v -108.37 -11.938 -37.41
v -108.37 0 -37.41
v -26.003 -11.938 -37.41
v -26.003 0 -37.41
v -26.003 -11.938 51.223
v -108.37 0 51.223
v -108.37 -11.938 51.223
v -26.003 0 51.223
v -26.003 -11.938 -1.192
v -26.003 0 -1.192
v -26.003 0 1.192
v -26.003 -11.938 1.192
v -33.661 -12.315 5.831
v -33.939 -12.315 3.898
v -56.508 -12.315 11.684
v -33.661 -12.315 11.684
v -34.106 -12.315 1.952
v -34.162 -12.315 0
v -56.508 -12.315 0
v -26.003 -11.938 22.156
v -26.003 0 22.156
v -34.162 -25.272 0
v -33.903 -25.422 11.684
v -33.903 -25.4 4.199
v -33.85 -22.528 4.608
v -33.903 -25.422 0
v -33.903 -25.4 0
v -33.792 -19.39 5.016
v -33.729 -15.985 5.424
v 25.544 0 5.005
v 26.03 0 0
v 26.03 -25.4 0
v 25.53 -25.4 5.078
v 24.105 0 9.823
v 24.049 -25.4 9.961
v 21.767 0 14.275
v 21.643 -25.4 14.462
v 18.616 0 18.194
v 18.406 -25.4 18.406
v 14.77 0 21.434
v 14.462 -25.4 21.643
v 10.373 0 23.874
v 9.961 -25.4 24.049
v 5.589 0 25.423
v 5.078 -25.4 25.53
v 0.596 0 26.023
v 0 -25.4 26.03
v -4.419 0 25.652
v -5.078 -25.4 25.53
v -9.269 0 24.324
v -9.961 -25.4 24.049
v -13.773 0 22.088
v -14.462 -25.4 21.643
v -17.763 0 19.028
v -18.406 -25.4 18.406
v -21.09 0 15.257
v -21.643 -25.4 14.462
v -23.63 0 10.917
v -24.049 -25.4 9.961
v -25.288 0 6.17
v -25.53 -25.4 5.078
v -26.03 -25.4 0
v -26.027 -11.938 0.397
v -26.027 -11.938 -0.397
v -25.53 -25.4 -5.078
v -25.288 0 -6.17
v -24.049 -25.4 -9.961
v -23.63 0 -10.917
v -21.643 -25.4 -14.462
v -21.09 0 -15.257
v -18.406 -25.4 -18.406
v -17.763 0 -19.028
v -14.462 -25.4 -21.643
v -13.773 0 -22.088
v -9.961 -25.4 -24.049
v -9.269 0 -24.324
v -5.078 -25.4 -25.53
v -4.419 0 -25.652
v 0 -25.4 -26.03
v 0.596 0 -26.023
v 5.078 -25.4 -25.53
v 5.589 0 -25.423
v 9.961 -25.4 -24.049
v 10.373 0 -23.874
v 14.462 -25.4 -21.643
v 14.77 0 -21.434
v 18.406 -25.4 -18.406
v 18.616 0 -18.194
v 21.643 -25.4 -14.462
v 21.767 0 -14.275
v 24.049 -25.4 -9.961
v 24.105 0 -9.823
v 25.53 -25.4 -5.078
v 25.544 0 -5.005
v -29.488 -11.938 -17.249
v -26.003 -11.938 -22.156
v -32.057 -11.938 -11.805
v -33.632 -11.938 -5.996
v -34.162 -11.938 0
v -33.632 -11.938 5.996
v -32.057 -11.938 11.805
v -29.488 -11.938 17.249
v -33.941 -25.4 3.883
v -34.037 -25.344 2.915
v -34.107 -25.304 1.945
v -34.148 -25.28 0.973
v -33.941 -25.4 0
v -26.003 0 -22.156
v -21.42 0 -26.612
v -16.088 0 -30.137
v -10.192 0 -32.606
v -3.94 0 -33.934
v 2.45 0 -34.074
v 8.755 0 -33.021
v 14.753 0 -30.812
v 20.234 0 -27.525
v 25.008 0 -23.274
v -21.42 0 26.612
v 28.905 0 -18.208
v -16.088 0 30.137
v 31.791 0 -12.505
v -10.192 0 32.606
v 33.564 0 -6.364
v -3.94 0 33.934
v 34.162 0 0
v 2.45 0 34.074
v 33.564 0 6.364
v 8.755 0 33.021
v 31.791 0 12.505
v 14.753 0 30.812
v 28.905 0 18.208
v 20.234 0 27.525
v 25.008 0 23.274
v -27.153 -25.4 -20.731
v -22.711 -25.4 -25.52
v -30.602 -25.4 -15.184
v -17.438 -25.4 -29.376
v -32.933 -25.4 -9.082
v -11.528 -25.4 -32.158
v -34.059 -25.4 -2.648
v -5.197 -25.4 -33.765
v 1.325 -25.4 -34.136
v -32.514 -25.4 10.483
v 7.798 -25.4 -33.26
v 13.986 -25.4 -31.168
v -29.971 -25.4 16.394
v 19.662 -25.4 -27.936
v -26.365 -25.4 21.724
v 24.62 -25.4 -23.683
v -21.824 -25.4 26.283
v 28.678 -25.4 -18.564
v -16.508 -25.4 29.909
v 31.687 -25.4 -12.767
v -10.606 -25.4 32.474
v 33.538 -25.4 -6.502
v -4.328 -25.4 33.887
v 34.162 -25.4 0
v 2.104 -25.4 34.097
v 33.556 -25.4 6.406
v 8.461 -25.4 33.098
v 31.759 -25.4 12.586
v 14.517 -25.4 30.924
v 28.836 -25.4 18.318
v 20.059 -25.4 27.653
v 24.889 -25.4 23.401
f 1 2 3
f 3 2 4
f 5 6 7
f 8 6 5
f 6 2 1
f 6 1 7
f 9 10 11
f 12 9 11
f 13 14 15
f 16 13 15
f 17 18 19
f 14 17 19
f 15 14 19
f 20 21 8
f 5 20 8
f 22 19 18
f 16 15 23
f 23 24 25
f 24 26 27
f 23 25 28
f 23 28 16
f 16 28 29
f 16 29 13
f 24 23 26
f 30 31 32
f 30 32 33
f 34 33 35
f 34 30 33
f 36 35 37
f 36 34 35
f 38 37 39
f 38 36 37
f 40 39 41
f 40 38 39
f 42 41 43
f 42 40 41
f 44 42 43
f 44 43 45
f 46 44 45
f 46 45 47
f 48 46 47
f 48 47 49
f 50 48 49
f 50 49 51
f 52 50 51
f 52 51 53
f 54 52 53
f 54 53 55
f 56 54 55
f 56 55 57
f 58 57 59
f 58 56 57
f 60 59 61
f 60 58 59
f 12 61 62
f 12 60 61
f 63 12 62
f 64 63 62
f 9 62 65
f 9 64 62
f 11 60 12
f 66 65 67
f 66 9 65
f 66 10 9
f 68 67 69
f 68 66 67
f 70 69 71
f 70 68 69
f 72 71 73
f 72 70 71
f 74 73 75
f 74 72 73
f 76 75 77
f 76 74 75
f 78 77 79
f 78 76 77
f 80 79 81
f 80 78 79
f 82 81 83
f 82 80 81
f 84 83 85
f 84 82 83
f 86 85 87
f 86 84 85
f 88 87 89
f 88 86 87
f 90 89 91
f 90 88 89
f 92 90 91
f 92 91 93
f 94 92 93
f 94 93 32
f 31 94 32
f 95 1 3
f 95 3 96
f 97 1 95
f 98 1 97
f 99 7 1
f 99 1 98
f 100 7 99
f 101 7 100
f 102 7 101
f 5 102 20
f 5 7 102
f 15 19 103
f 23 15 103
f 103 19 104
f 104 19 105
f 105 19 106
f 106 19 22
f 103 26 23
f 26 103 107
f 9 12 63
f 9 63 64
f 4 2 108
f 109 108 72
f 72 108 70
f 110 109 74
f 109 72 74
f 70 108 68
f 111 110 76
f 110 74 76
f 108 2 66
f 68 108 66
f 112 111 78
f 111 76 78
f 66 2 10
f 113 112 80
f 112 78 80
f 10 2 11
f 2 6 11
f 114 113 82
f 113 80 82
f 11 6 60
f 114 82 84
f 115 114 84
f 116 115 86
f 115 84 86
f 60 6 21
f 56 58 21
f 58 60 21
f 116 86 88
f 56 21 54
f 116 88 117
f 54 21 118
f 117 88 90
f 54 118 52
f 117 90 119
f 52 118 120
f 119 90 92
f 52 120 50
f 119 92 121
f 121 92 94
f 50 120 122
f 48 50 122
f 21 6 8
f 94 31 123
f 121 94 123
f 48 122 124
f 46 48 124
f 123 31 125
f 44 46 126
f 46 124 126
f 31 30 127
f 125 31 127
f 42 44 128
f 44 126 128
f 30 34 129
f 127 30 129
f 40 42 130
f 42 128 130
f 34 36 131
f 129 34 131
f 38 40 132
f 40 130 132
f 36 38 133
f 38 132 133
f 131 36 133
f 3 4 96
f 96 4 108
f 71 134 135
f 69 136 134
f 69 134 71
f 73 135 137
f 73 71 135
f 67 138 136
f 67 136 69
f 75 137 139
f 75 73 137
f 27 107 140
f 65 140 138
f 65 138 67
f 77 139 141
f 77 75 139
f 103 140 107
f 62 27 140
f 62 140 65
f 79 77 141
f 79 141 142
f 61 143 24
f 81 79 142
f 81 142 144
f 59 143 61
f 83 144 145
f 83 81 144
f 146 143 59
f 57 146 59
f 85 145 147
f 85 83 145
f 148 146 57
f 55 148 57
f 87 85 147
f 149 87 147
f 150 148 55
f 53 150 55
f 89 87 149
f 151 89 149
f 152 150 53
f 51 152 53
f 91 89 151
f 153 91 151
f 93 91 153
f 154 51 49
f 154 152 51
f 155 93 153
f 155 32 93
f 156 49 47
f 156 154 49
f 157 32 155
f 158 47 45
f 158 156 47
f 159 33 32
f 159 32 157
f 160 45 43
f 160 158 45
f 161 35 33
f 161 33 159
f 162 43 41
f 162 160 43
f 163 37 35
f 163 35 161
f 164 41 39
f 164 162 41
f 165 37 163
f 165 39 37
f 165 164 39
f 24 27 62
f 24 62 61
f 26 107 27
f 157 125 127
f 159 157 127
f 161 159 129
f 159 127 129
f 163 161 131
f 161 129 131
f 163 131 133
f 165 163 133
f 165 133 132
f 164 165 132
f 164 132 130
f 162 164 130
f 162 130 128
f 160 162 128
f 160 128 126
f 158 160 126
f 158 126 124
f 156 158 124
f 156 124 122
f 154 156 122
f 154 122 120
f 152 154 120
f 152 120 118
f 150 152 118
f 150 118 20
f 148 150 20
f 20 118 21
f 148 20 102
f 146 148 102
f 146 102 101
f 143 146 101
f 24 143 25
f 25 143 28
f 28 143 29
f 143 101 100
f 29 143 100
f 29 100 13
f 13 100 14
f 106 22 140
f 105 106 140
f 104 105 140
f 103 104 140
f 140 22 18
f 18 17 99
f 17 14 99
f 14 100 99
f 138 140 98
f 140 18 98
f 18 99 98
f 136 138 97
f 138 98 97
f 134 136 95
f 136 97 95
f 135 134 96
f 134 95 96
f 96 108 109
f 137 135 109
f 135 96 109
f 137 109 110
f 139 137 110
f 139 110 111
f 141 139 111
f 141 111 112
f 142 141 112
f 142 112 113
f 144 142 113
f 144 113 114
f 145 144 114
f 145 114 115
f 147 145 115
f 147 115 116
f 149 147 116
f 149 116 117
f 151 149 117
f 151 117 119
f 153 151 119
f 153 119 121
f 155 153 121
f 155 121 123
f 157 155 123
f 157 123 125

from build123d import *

# Parameters (mm, degrees)
F0_R     = 34.162118
F0_R_2   = 26.03014
F1_DEPTH = 25.4
F2_W     = 82.366947
F2_H     = 88.6334
F3_DEPTH = 11.938
F5_DEPTH = 11.684


with BuildPart() as f1:
    # F0 (on Front) → F1 (new body)
    with BuildSketch(Plane.XZ):
        Circle(F0_R)
        Circle(F0_R_2, mode=Mode.SUBTRACT)
    extrude(amount=F1_DEPTH)

    # F2 (on Front) → F3 (join)
    with BuildSketch(Plane.XZ):
        with Locations((-67.186301, 6.906649)):
            Rectangle(F2_W, F2_H)
    extrude(amount=F3_DEPTH)

    # F4 (on Top) → F5 (join)
    with BuildSketch(Plane.XY):
        Polygon((-56.507535, -12.315094), (-33.903457, -25.42158), (-33.660881, -12.315094), align=None)
    extrude(amount=F5_DEPTH)


solid = f1.part
